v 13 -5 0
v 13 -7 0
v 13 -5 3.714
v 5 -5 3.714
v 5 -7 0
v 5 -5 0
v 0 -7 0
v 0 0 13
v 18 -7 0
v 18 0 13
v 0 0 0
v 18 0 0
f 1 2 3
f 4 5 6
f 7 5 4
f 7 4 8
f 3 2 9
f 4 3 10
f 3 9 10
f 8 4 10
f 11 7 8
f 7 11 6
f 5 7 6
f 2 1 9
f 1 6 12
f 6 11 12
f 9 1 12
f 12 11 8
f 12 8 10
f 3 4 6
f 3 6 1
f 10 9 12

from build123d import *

# Parameters (mm, degrees)
F0_W     = 18
F0_H     = 7
F1_DEPTH = 13
F2_W     = 8
F2_H     = 2
F3_DEPTH = 13.001
F5_DEPTH = 18.001


with BuildPart() as f1:
    # F0 (on Top) → F1 (new body)
    with BuildSketch(Plane.XY):
        with Locations((9, -3.5)):
            Rectangle(F0_W, F0_H)
    extrude(amount=F1_DEPTH)

    # F2 (on face) → F3 (cut, through all)
    with BuildSketch(Plane.XY.offset(13)):
        with Locations((9, -6)):
            Rectangle(F2_W, F2_H)
    extrude(amount=-F3_DEPTH, mode=Mode.SUBTRACT)

    # F4 (on face) → F5 (cut, through all)
    with BuildSketch(Plane.YZ.offset(18)):
        Polygon((-7, 0), (0, 13), (-7, 13), align=None)
    extrude(amount=-F5_DEPTH, mode=Mode.SUBTRACT)


solid = f1.part
